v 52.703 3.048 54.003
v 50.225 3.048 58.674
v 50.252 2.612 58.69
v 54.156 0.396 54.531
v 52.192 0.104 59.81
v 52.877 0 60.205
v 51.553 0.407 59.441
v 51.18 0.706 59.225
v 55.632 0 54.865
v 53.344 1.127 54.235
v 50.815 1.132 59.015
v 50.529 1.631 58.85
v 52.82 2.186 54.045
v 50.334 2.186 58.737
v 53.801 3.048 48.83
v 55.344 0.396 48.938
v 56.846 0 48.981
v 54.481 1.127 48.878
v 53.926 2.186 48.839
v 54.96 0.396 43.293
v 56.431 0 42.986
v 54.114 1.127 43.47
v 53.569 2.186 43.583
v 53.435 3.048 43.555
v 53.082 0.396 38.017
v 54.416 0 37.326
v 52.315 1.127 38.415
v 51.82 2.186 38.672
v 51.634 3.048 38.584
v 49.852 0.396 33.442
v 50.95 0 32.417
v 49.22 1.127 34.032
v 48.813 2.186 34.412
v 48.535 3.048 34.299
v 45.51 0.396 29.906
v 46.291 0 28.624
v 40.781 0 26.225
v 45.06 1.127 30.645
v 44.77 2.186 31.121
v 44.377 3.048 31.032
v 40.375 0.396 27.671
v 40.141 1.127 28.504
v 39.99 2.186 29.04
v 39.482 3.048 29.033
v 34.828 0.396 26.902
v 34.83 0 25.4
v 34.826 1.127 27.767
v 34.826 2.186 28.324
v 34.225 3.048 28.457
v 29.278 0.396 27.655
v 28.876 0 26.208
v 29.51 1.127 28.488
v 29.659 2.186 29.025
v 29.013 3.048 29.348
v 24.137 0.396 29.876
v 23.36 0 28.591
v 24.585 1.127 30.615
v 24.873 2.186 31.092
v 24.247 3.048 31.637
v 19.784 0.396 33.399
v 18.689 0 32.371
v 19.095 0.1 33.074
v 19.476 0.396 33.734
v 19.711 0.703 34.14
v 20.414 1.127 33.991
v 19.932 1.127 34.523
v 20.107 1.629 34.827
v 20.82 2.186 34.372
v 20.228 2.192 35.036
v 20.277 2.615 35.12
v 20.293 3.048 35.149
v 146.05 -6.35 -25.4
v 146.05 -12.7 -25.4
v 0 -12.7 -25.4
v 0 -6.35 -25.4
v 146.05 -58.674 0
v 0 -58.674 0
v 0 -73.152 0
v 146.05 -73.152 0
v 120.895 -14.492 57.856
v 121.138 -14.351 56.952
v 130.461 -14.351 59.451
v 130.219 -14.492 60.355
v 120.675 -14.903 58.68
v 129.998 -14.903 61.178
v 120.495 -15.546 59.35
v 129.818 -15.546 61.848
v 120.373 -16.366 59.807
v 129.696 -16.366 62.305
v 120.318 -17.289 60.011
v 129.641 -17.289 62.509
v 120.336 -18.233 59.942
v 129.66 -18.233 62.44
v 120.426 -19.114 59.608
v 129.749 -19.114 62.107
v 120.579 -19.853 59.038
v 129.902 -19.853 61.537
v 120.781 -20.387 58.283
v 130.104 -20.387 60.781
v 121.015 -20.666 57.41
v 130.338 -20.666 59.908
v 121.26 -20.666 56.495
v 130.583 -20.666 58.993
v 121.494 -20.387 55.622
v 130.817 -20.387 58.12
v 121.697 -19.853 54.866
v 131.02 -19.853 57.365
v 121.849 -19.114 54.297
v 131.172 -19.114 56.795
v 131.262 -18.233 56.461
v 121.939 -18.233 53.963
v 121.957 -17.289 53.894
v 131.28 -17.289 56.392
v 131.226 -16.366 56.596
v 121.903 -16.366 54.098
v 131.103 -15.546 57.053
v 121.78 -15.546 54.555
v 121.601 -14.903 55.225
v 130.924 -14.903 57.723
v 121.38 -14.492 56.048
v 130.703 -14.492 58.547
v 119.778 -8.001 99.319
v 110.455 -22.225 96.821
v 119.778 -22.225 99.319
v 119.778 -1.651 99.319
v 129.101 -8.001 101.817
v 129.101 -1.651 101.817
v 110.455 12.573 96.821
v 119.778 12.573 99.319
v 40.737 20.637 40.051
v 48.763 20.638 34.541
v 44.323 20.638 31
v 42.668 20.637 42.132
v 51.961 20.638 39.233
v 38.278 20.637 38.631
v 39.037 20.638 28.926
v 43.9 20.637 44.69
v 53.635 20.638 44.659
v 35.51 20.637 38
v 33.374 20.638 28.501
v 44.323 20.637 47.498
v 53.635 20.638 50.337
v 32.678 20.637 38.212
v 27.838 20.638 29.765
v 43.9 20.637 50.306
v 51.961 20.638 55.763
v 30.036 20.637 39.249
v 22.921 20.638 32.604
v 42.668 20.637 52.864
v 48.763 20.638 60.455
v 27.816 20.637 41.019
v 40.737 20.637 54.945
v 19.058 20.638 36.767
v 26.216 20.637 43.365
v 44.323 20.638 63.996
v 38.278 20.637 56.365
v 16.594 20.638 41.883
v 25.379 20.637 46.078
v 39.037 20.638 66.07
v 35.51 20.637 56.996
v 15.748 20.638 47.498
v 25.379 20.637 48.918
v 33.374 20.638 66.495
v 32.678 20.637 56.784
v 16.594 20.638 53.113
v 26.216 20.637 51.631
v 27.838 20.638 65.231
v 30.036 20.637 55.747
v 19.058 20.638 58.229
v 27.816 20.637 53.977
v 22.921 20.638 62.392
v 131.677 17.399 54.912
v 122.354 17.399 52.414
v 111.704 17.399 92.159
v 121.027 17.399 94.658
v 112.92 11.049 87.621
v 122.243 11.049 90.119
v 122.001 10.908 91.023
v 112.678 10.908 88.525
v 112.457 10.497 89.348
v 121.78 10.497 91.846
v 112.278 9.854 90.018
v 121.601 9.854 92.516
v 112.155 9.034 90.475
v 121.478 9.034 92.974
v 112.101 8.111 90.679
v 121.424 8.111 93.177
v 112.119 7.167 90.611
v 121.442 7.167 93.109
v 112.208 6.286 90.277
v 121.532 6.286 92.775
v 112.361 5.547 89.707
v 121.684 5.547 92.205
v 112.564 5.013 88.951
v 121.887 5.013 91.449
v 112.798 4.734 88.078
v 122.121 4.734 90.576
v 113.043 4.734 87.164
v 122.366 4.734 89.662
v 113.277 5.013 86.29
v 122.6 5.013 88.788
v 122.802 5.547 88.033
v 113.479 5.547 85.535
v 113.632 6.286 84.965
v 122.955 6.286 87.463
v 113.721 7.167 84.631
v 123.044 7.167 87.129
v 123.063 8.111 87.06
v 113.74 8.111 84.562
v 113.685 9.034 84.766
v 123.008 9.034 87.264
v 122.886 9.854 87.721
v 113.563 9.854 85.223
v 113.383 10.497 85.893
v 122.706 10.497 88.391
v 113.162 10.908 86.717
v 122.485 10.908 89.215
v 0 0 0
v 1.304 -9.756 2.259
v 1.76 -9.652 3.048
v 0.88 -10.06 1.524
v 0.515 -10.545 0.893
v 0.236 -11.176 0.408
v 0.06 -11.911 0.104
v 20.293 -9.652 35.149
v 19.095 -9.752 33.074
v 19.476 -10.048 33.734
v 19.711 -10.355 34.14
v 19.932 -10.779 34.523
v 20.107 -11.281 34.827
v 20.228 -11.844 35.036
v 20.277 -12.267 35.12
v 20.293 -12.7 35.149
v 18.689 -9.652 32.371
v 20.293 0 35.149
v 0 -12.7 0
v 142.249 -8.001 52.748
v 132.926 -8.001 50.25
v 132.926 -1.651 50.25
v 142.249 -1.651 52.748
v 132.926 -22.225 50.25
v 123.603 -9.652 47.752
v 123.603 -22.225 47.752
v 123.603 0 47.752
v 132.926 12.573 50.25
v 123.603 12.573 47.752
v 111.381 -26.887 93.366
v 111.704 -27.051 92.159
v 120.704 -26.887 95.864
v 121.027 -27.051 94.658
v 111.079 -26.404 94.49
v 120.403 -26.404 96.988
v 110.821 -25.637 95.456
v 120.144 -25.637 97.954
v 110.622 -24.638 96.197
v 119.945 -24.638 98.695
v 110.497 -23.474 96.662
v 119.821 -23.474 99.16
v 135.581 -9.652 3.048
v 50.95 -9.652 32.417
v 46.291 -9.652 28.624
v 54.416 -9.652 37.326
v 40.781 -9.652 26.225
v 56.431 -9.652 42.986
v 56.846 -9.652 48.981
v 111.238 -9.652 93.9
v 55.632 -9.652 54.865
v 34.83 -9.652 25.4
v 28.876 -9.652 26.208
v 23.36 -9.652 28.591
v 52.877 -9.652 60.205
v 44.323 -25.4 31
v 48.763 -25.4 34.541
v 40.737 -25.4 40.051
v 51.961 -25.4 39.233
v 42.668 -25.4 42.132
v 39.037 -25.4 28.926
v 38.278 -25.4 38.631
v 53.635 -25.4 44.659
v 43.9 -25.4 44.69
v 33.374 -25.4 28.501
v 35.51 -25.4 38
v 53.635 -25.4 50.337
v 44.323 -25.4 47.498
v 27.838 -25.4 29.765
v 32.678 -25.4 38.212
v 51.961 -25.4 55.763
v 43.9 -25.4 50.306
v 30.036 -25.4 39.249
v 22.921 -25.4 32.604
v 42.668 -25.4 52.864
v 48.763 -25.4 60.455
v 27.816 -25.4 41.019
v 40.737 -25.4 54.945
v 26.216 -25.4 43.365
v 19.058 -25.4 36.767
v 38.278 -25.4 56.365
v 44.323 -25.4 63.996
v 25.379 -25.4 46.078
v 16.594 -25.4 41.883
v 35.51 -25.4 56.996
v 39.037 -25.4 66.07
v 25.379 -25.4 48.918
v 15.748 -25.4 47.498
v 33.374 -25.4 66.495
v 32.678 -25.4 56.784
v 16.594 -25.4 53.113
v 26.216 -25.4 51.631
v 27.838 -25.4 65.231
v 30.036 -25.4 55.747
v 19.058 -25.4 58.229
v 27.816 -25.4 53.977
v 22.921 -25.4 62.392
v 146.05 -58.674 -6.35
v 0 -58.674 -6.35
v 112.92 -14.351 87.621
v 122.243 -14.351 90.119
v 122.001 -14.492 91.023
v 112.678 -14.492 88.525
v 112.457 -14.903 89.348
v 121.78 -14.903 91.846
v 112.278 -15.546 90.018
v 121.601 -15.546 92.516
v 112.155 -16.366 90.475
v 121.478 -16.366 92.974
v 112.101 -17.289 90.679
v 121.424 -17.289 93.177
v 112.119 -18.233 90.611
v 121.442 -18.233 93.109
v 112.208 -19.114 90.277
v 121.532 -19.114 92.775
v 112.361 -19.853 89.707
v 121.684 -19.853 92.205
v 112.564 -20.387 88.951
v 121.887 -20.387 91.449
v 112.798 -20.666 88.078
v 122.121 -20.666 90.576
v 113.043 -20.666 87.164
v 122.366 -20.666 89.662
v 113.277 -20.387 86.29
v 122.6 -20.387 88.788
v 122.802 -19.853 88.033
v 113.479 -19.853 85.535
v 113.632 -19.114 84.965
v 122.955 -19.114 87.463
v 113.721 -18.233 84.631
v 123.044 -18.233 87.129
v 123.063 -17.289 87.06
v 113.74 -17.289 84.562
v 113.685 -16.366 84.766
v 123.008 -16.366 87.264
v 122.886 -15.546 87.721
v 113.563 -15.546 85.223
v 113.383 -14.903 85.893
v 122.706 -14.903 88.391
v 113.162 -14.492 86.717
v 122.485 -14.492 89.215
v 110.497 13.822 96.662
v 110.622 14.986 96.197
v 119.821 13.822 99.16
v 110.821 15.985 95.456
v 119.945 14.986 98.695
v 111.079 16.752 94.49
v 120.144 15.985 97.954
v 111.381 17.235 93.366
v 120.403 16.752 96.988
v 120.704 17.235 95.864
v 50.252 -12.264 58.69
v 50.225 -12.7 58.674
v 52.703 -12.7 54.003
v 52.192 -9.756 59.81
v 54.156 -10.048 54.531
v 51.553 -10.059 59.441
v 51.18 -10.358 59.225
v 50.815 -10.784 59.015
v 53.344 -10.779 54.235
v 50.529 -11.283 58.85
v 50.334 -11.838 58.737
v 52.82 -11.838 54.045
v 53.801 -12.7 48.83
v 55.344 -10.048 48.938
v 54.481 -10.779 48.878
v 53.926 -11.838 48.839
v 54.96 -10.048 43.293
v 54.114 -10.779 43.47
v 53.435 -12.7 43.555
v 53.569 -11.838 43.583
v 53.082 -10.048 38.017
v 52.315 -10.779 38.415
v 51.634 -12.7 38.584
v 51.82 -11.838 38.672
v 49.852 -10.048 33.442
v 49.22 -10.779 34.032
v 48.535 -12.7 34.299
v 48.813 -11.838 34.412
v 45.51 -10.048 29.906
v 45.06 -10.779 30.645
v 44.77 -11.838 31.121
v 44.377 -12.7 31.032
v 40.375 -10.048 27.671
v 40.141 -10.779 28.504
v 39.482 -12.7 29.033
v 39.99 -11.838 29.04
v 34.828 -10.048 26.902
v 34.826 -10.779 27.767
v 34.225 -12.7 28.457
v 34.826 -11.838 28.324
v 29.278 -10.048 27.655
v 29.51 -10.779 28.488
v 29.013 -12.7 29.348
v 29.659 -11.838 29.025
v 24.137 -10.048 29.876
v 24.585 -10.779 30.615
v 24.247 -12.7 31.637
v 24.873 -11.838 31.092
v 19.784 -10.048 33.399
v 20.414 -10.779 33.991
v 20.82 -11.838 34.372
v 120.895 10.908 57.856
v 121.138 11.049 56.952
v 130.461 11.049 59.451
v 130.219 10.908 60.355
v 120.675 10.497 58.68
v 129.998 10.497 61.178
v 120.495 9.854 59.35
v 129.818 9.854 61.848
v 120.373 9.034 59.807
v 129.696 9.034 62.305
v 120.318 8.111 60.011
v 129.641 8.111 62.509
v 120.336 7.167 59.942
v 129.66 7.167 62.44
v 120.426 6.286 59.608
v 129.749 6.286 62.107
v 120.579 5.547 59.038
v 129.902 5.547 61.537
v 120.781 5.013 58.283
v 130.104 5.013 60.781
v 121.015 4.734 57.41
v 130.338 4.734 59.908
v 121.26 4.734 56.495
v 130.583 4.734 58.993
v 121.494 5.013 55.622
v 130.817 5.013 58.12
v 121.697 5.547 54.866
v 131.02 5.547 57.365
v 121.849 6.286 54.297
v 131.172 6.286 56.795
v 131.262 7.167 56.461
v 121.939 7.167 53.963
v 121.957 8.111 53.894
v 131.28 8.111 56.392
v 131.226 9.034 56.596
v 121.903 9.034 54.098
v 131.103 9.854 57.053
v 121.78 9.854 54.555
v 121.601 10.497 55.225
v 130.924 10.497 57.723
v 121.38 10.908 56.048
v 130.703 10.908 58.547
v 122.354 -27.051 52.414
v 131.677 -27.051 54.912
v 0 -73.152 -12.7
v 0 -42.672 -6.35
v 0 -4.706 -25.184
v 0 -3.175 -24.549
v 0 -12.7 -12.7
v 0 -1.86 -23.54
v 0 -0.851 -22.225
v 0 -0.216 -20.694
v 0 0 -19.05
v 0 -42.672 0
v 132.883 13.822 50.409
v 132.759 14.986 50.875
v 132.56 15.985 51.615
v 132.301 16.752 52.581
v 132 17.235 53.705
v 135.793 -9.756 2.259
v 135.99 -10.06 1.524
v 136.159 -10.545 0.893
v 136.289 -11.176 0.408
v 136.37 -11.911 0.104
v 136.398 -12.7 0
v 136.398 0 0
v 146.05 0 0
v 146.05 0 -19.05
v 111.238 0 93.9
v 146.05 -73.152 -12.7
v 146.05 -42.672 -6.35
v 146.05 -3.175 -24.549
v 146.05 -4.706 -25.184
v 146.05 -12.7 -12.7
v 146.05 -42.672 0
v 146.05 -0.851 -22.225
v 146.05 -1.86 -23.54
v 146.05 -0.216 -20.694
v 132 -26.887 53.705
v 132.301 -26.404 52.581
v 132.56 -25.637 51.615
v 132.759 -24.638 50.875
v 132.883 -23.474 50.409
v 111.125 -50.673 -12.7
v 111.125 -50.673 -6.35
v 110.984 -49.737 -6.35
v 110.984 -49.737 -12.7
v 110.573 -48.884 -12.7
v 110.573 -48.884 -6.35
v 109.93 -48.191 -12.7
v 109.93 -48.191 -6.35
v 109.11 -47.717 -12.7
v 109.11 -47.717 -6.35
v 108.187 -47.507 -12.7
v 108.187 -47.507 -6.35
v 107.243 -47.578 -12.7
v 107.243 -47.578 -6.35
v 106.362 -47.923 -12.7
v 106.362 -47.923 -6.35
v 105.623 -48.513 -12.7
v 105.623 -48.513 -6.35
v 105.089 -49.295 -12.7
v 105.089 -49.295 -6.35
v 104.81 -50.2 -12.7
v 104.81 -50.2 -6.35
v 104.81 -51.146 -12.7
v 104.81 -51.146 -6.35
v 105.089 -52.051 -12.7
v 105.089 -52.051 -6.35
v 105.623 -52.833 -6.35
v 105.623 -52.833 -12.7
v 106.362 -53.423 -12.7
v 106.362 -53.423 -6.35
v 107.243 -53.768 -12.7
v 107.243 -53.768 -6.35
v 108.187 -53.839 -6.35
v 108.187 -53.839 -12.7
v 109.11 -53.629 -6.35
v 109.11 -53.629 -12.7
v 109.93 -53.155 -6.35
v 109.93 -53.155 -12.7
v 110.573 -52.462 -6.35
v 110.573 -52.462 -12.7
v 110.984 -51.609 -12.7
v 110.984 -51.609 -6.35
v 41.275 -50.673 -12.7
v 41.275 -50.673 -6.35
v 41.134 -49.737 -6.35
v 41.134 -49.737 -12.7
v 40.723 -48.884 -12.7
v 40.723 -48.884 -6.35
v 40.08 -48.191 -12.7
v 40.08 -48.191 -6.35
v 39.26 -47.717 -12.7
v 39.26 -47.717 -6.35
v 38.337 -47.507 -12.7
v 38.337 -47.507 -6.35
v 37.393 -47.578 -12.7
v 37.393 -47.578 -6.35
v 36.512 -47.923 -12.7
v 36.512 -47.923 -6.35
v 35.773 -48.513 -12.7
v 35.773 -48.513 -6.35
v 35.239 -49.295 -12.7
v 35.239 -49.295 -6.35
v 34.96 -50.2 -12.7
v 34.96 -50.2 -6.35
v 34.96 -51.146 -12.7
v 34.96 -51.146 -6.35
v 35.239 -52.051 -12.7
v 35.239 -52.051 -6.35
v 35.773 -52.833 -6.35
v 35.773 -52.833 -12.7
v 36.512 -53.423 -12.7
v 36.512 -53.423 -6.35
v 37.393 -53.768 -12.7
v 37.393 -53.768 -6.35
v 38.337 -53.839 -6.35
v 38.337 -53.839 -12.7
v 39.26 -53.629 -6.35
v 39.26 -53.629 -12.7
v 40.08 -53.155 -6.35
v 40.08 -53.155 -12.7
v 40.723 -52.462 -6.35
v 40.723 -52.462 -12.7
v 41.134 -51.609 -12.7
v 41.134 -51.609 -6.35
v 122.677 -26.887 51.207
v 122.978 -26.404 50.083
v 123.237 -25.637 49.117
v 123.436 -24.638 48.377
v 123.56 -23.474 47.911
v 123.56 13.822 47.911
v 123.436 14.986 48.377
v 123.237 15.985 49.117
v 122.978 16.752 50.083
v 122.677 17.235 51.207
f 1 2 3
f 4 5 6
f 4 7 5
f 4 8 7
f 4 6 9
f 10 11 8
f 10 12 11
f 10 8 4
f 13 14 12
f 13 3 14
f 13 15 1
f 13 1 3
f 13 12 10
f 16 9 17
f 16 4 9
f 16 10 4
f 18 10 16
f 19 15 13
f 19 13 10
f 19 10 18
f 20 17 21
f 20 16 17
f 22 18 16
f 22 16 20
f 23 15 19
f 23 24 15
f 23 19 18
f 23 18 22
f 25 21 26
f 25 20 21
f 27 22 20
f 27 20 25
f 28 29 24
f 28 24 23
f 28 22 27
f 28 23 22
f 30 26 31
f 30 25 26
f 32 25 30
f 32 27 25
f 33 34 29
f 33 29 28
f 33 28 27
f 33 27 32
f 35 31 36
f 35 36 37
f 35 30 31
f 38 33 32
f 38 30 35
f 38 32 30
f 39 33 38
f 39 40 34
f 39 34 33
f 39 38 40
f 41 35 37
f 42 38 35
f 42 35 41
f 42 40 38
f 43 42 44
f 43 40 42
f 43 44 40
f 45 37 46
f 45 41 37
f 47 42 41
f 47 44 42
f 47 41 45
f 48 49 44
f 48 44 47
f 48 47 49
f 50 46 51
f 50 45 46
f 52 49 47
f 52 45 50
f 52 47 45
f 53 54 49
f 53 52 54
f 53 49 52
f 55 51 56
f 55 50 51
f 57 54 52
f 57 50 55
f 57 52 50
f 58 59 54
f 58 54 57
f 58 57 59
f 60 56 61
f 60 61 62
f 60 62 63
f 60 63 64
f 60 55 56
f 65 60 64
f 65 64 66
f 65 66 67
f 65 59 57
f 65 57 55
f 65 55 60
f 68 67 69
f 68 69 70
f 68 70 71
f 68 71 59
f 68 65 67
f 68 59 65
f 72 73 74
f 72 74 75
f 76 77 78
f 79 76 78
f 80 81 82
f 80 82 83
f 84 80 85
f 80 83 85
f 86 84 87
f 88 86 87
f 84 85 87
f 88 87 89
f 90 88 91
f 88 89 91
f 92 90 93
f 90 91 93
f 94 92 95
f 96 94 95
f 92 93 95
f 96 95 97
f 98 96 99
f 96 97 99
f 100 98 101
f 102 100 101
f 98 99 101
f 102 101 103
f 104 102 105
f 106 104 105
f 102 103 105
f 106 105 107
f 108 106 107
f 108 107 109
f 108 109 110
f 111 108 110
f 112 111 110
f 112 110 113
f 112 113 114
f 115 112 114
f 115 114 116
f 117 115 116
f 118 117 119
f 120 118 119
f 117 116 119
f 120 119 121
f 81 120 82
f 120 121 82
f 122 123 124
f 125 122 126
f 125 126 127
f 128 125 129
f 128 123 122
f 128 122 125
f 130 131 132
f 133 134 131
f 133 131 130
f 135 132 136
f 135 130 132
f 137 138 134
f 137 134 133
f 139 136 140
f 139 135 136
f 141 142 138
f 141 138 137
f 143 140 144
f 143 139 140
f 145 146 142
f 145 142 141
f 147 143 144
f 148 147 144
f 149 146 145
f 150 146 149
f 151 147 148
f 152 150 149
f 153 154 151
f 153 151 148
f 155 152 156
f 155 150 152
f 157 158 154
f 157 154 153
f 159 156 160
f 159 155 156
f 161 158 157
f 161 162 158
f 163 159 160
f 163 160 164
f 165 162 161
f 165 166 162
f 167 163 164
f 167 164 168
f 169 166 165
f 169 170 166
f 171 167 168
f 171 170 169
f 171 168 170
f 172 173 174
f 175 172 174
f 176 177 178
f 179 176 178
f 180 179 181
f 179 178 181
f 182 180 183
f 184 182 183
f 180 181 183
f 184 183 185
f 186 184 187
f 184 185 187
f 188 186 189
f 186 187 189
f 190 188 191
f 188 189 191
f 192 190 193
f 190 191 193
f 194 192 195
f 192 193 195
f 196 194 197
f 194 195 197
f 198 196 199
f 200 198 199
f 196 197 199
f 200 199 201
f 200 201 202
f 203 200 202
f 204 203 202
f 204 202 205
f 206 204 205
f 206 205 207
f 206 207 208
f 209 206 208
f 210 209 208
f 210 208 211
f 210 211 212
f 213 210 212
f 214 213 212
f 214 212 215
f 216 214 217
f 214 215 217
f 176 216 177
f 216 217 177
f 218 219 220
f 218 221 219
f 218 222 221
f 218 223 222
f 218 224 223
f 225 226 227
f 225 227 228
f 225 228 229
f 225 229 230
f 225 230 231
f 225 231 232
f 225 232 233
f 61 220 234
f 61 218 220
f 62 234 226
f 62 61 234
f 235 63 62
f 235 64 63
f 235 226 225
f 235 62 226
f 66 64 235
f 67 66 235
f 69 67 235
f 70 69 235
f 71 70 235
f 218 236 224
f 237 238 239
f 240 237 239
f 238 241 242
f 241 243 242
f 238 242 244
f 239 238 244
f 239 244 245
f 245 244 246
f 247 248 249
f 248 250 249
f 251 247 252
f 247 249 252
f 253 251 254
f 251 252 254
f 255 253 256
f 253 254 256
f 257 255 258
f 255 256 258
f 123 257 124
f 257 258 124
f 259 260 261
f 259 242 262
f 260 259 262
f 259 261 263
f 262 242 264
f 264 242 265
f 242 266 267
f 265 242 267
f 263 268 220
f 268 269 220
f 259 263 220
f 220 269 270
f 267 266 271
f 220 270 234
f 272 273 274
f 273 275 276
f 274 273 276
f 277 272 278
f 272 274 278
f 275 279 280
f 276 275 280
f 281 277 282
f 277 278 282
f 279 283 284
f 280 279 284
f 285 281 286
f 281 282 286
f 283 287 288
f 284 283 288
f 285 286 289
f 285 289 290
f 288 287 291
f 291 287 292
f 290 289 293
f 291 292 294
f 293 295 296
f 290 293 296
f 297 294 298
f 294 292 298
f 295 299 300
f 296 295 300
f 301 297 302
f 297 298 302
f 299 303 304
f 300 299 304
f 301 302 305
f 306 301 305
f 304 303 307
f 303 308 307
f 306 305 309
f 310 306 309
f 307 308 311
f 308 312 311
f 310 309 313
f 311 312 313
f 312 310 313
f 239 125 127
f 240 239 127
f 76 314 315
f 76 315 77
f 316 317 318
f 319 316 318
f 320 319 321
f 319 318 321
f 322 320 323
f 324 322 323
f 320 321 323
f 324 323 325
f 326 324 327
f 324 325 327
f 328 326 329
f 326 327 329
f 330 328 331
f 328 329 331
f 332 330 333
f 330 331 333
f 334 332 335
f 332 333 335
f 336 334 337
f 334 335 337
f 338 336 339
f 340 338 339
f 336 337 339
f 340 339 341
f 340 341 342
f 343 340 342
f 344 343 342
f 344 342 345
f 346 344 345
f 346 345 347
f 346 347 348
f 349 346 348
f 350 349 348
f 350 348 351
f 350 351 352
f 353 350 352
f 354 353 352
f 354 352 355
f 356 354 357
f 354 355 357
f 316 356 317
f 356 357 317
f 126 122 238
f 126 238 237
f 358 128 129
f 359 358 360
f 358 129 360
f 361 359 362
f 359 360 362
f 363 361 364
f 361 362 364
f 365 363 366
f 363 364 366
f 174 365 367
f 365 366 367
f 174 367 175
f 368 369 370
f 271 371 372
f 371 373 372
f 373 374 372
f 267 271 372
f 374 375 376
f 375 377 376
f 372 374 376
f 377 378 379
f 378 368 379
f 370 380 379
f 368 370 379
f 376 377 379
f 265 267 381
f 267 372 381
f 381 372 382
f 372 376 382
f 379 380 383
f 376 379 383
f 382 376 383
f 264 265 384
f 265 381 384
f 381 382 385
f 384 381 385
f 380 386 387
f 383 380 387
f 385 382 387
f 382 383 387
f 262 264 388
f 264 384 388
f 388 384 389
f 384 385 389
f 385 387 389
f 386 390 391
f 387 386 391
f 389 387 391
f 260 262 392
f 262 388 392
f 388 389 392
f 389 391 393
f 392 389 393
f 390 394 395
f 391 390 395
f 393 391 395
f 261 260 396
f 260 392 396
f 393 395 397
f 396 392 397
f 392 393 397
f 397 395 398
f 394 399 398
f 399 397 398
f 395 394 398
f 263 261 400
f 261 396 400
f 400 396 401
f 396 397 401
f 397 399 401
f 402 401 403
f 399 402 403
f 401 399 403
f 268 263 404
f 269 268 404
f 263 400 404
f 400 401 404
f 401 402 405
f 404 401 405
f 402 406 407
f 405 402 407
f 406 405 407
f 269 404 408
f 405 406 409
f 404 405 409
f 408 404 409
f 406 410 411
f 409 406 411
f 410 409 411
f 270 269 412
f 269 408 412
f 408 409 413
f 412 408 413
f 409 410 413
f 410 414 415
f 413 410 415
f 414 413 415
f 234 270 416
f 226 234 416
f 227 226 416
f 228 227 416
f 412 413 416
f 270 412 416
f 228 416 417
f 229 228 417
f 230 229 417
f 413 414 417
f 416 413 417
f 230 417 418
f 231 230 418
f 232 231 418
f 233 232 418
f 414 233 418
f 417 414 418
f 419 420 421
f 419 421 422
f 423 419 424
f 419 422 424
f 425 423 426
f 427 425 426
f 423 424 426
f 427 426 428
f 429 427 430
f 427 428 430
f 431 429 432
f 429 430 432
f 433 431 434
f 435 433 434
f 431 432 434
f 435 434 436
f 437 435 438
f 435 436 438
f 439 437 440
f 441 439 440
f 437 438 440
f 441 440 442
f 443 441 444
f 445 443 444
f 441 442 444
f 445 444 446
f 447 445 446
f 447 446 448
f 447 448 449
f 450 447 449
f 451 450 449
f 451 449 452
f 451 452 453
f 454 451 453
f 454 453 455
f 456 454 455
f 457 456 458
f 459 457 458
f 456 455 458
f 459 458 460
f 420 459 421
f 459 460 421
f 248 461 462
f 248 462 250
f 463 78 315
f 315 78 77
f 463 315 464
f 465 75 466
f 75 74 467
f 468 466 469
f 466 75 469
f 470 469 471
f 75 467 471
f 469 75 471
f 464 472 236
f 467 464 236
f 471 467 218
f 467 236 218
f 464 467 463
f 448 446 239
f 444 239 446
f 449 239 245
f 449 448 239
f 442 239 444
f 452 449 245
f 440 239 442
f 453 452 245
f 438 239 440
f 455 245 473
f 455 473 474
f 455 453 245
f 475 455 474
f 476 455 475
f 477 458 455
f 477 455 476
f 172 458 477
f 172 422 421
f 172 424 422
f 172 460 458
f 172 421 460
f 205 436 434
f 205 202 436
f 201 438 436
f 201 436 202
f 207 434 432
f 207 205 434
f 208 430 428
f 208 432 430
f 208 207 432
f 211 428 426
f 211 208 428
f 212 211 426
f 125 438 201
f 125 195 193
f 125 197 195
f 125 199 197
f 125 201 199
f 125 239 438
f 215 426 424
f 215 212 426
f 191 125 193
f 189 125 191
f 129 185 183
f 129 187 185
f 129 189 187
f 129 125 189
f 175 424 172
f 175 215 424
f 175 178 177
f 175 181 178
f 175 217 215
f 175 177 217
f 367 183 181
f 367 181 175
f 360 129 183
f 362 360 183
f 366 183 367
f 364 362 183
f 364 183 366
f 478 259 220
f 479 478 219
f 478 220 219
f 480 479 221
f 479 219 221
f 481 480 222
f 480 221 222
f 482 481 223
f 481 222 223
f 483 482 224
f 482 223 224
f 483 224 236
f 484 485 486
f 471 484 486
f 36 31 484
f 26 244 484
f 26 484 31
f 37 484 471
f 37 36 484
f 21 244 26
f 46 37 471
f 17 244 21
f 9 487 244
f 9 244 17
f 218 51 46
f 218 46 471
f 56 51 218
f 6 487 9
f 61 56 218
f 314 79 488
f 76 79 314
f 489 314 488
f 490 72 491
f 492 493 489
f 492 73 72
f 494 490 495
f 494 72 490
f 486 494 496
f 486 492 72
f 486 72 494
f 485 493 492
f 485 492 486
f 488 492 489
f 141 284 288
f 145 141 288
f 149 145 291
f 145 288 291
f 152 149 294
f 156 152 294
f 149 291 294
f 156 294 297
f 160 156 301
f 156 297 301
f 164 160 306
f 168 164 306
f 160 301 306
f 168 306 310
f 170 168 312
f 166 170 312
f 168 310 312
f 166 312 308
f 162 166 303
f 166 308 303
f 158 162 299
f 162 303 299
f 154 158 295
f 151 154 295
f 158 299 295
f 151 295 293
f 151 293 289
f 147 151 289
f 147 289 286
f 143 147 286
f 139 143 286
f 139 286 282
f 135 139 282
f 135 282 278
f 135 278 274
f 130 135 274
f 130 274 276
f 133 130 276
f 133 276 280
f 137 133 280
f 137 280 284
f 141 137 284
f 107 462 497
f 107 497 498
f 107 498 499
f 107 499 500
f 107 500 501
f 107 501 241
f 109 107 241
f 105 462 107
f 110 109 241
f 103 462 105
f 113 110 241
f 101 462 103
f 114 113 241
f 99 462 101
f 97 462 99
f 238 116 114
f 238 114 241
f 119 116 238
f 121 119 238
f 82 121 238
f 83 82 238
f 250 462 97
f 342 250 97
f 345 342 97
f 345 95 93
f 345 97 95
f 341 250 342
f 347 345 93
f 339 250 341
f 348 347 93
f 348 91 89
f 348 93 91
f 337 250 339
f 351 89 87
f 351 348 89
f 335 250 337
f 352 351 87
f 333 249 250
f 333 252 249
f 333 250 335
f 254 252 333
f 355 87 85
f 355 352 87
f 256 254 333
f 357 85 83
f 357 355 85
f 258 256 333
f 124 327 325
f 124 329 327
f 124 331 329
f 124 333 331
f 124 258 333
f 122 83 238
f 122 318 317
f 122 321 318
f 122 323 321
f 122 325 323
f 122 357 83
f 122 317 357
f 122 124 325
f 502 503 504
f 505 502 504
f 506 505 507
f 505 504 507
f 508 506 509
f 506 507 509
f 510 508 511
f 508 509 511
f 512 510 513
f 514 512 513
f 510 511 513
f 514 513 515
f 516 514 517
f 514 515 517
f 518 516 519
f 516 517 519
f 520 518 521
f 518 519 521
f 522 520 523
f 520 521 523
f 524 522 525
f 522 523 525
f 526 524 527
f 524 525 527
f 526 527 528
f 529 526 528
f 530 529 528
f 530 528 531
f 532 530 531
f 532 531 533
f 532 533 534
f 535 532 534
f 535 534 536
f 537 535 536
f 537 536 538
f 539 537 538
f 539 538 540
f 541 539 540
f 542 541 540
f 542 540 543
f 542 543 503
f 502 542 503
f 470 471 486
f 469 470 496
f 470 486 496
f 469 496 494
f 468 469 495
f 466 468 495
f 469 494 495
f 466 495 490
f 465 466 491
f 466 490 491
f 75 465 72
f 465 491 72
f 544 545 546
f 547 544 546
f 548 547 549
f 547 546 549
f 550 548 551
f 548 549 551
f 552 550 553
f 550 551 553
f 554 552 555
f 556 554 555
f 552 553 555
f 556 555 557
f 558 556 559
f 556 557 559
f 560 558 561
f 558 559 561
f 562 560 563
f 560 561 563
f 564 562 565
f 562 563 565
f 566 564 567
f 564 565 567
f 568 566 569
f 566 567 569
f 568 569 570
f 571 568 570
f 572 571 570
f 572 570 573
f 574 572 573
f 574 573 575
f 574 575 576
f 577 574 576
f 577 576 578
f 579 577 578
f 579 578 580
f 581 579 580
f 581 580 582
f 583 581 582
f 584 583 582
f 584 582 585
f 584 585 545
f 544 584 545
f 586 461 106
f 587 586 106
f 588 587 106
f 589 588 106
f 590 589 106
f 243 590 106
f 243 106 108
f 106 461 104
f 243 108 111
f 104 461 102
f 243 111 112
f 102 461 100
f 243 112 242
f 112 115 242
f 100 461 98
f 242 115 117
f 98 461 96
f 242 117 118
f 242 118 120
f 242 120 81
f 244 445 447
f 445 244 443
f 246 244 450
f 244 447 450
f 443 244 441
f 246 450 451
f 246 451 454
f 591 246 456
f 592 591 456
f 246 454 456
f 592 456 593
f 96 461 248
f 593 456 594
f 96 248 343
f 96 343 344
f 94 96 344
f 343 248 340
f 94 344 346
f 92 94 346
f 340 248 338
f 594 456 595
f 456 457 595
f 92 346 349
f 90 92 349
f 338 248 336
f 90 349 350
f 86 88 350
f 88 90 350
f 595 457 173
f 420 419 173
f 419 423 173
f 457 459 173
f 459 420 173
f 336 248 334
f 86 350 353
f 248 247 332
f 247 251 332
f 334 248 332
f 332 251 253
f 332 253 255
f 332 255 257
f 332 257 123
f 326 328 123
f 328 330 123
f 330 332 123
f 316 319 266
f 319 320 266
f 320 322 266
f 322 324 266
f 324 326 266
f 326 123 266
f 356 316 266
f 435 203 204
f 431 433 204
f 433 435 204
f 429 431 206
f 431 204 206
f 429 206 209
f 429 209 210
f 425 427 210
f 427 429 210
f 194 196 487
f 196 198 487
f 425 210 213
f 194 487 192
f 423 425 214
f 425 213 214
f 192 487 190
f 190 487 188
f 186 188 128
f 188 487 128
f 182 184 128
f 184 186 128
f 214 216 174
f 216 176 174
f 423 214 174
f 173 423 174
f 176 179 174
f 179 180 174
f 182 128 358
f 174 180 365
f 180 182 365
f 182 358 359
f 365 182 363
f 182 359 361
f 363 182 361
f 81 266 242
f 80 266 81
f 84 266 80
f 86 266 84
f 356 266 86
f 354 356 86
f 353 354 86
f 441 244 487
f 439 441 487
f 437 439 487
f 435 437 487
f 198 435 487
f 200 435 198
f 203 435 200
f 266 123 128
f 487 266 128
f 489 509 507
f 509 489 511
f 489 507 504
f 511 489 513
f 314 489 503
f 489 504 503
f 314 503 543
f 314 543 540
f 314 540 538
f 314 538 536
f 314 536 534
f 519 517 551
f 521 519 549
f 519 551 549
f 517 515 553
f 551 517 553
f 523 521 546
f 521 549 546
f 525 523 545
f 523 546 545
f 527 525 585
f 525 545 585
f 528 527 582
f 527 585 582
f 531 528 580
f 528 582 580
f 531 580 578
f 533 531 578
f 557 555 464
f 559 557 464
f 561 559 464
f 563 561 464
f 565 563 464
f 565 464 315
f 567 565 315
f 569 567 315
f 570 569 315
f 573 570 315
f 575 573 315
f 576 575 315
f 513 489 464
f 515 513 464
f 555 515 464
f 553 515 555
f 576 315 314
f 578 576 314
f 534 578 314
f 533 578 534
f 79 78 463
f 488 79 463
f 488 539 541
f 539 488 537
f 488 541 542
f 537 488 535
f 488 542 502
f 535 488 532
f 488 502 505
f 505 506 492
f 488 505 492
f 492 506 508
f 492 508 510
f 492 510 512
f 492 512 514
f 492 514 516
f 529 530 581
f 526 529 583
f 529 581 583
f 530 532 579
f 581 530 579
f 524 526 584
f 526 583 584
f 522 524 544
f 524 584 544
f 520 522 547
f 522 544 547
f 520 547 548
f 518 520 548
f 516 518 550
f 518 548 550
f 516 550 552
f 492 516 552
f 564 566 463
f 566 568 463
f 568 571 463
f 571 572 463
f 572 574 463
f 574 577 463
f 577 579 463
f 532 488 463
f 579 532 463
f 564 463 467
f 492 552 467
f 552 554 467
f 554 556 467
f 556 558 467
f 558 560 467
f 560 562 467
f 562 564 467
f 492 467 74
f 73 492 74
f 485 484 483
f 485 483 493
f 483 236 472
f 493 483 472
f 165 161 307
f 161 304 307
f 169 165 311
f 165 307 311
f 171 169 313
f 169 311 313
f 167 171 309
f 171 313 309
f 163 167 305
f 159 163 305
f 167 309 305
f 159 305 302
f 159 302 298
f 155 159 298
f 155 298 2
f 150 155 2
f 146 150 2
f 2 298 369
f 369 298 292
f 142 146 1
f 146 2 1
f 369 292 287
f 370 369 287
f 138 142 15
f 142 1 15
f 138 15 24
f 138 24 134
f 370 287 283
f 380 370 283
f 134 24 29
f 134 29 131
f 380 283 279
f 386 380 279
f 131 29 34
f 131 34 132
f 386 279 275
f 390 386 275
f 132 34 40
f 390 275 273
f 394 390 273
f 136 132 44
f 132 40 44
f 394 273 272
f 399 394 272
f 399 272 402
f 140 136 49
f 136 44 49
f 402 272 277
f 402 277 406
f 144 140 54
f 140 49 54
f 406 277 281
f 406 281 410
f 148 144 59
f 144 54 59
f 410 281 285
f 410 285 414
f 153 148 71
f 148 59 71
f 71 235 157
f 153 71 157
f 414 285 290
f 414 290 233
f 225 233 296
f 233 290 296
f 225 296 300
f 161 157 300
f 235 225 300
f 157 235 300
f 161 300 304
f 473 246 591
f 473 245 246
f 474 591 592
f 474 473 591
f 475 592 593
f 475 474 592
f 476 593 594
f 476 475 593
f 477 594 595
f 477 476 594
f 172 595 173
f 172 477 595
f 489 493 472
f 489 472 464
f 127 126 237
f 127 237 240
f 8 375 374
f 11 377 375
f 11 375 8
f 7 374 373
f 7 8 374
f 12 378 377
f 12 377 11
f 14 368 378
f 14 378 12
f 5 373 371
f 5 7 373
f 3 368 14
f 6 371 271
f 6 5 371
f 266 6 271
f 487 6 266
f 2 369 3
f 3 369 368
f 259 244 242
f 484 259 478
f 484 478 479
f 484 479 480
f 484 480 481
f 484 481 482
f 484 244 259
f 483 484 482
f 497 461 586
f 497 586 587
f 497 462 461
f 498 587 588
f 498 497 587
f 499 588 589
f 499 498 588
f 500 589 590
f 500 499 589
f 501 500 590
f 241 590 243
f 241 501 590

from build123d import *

# Parameters (mm, degrees)
F1_DEPTH      = 146.05
F2_R          = 3.175
F3_DEPTH      = 19.051
F4_R          = 6.35
F6_DEPTH      = 9.652
F7_R          = 19.05
F8_DEPTH      = 25.4
F8_DEPTH_BACK = 20.6375
F9_R          = 9.525
F10_DEPTH     = 46.0385
F11_W         = 44.45
F11_H         = 50.8
F12_DEPTH     = 9.652
F13_R         = 3.175
F14_DEPTH     = 9.652
F15_W         = 9.652
F15_H         = 6.35
F16_DEPTH     = 50.8
F17_R         = 4.826
F18_R         = 3.048


with BuildPart() as f1:
    # F0 (on Right) → F1 (new body)
    with BuildSketch(Plane.YZ):
        Polygon((0, -25.4), (0, 0), (-42.672, 0), (-42.672, -6.35), (-58.674, -6.35), (-58.674, 0), (-73.152, 0), (-73.152, -12.7), (-12.7, -12.7), (-12.7, -25.4), align=None)
    extrude(amount=F1_DEPTH)

    # F2 (on face) → F3 (cut, through all)
    with BuildSketch(Plane.XY.offset(-6.35)):
        with Locations((107.95, -50.673)):
            Circle(F2_R)
        with Locations((38.1, -50.673)):
            Circle(F2_R)
    extrude(amount=-F3_DEPTH, mode=Mode.SUBTRACT)

    # F4
    f4_edges = [f1.edges().sort_by_distance(p)[0] for p in [
        (73.025, 0, -25.4),
    ]]
    fillet(f4_edges, radius=F4_R)

    # F5 (on face) → F6 (join)
    with BuildSketch(Plane(origin=(0, 0, 0), x_dir=(-1, 0, 0), z_dir=(0, 1, 0))):
        Polygon((-20.2930348437, 35.148567389), (-34.798, 47.498), (-50.2252331933, 58.674), (-111.237689279, 93.899557945), (-136.398, 0), (0, 0), align=None)
    extrude(amount=-F6_DEPTH)

    # F7 (on face) → F8 (join, two sides)
    with BuildSketch(Plane(origin=(0, 0, 0), x_dir=(-1, 0, 0), z_dir=(0, 1, 0))) as f8_sk:
        with Locations((-34.798, 47.498)):
            Circle(F7_R)
    extrude(amount=-F8_DEPTH)
    extrude(f8_sk.sketch, amount=F8_DEPTH_BACK)

    # F9 (on face) → F10 (cut, through all)
    with BuildSketch(Plane.XZ.offset(25.4)):
        with Locations((34.798, 47.498)):
            Circle(F9_R)
    extrude(amount=-F10_DEPTH, mode=Mode.SUBTRACT)

    # F11 (on face) → F12 (join)
    with BuildSketch(Plane(origin=(127.2610665127, 0, 34.0995), x_dir=(0, 1, 0), z_dir=(0.9659258263, 0, 0.2588190451))):
        with Locations((-4.826, 39.534108053)):
            Rectangle(F11_W, F11_H)
    extrude(amount=F12_DEPTH)

    # F13 (on face) → F14 (cut)
    with BuildSketch(Plane(origin=(136.584182588, 0, 36.5976214233), x_dir=(0, 1, 0), z_dir=(0.9659258263, 0, 0.2588190451))):
        with Locations((-17.526, 55.409108053)):
            Circle(F13_R)
        with Locations((7.874, 55.409108053)):
            Circle(F13_R)
        with Locations((7.874, 23.659108053)):
            Circle(F13_R)
        with Locations((-17.526, 23.659108053)):
            Circle(F13_R)
    extrude(amount=-F14_DEPTH, mode=Mode.SUBTRACT)

    # F15 (on face) → F16 (join)
    with BuildSketch(Plane(origin=(-16.8061838409, 0, 62.7215319755), x_dir=(0.9659258263, 0, 0.2588190451), z_dir=(-0.2588190451, 0, 0.9659258263))):
        with Locations((146.2283508542, -4.826)):
            Rectangle(F15_W, F15_H)
    extrude(amount=-F16_DEPTH)

    # F17
    f17_edges = [f1.edges().sort_by_distance(p)[0] for p in [
        (115.116441, -27.051, 98.070093),
        (115.116441, 17.399, 98.070093),
        (128.264448, -27.051, 49.001061),
        (128.264448, 17.399, 49.001061),
    ]]
    fillet(f17_edges, radius=F17_R)

    # F18
    f18_edges = [f1.edges().sort_by_distance(p)[0] for p in [
        (46.569752, 0, 32.520405),
        (46.569752, -9.652, 32.520405),
        (68.199, -9.652, 0),
    ]]
    fillet(f18_edges, radius=F18_R)


solid = f1.part
